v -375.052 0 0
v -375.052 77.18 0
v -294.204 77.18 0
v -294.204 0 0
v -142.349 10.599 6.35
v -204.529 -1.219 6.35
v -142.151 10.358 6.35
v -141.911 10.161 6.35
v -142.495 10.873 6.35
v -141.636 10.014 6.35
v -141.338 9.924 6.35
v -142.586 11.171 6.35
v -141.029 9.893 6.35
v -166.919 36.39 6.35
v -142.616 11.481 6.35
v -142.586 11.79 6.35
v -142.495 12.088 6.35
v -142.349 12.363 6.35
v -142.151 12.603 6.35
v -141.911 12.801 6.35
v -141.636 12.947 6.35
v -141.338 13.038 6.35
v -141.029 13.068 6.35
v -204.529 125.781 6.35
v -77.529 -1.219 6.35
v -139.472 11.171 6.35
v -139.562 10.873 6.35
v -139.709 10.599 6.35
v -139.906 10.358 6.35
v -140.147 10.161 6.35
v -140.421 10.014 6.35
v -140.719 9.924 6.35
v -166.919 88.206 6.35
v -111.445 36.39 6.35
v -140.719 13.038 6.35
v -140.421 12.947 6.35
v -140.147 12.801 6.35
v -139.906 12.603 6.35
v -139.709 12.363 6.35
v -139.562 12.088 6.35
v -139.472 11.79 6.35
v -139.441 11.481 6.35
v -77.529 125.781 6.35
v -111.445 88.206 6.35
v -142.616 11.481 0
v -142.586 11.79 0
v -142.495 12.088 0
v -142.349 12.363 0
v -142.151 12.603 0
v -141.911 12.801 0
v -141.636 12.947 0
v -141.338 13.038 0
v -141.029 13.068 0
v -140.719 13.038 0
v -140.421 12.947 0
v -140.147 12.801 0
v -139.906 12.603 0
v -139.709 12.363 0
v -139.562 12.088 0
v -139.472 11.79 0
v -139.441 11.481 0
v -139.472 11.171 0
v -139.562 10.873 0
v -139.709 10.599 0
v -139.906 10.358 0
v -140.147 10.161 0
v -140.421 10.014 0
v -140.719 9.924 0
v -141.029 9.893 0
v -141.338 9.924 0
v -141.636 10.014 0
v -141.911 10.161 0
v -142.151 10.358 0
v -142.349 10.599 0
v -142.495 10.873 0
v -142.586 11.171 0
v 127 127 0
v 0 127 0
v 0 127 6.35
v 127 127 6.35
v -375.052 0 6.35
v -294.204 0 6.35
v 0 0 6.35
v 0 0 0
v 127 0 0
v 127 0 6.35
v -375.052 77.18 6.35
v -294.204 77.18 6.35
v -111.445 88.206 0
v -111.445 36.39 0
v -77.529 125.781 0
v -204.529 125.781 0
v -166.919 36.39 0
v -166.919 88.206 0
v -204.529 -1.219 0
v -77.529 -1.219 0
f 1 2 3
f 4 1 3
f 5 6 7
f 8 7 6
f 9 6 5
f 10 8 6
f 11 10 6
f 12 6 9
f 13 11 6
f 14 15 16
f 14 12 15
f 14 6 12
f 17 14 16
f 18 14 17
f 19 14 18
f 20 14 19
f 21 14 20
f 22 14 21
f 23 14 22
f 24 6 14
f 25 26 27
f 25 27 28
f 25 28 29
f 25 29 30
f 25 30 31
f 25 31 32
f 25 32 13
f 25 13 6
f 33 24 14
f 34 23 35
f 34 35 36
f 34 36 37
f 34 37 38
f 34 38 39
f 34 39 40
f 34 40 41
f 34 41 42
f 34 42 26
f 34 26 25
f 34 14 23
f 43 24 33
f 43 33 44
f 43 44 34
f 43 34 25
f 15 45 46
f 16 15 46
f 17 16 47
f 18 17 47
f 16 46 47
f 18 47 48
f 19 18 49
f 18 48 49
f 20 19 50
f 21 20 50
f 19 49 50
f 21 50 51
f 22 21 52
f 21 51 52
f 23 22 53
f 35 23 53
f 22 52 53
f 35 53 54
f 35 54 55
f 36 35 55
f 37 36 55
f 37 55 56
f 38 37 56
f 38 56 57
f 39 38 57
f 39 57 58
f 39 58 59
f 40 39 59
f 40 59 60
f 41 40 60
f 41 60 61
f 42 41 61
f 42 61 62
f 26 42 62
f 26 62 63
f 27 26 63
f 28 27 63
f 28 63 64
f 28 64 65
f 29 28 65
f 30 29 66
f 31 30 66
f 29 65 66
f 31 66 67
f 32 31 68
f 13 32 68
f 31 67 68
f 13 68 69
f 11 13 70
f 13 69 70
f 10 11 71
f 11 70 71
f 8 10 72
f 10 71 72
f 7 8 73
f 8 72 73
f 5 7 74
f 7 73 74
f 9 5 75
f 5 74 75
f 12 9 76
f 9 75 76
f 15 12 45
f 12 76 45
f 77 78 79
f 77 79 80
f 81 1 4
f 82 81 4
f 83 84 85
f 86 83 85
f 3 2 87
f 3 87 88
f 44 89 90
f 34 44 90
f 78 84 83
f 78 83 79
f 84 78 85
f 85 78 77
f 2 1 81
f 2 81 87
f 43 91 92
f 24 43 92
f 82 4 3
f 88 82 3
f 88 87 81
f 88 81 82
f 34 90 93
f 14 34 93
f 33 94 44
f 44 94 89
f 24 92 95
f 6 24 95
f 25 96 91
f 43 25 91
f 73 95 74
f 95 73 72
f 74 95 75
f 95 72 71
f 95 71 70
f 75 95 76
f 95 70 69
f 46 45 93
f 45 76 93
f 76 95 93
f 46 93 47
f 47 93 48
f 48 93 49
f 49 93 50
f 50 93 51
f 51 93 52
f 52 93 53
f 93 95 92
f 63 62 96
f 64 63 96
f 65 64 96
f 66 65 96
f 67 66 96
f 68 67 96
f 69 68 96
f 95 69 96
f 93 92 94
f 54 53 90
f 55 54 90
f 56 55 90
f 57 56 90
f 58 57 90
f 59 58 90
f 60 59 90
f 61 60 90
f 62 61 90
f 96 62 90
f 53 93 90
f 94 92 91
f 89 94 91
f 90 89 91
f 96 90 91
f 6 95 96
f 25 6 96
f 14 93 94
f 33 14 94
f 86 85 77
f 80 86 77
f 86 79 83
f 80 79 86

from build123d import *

# Parameters (mm, degrees)
F0_W     = 127
F0_H     = 127
F1_DEPTH = 6.35
F2_W     = 80.8482
F2_H     = 77.18044
F3_DEPTH = 6.35
F5_D     = 3.175
F5_DEPTH = 63.5


with BuildPart() as f1:
    # F0 (on Top) → F1 (new body)
    with BuildSketch(Plane.XY):
        with Locations((63.5, 63.5)):
            Rectangle(F0_W, F0_H)
        Polygon((-204.528752, 125.780657), (-204.528752, -1.219343), (-141.028752, -1.219343), (-77.528752, -1.219343), (-77.528752, 125.780657), align=None)
        Polygon((-166.918972, 62.280657), (-166.918972, 88.206437), (-111.445372, 88.206437), (-111.445372, 62.280657), (-111.445372, 36.390437), (-141.028752, 36.390437), (-166.918972, 36.390437), align=None, mode=Mode.SUBTRACT)
    extrude(amount=F1_DEPTH)

    # F5
    with Locations(Plane.XY.offset(6.35)):
        with Locations((-141.028752, 11.480657)):
            Hole(F5_D / 2, depth=F5_DEPTH)


with BuildPart() as f3:
    # F2 (on Top) → F3 (new body)
    with BuildSketch(Plane.XY):
        with Locations((-334.628343, 38.59022)):
            Rectangle(F2_W, F2_H)
    extrude(amount=F3_DEPTH)


solid = Compound([f1.part, f3.part])
